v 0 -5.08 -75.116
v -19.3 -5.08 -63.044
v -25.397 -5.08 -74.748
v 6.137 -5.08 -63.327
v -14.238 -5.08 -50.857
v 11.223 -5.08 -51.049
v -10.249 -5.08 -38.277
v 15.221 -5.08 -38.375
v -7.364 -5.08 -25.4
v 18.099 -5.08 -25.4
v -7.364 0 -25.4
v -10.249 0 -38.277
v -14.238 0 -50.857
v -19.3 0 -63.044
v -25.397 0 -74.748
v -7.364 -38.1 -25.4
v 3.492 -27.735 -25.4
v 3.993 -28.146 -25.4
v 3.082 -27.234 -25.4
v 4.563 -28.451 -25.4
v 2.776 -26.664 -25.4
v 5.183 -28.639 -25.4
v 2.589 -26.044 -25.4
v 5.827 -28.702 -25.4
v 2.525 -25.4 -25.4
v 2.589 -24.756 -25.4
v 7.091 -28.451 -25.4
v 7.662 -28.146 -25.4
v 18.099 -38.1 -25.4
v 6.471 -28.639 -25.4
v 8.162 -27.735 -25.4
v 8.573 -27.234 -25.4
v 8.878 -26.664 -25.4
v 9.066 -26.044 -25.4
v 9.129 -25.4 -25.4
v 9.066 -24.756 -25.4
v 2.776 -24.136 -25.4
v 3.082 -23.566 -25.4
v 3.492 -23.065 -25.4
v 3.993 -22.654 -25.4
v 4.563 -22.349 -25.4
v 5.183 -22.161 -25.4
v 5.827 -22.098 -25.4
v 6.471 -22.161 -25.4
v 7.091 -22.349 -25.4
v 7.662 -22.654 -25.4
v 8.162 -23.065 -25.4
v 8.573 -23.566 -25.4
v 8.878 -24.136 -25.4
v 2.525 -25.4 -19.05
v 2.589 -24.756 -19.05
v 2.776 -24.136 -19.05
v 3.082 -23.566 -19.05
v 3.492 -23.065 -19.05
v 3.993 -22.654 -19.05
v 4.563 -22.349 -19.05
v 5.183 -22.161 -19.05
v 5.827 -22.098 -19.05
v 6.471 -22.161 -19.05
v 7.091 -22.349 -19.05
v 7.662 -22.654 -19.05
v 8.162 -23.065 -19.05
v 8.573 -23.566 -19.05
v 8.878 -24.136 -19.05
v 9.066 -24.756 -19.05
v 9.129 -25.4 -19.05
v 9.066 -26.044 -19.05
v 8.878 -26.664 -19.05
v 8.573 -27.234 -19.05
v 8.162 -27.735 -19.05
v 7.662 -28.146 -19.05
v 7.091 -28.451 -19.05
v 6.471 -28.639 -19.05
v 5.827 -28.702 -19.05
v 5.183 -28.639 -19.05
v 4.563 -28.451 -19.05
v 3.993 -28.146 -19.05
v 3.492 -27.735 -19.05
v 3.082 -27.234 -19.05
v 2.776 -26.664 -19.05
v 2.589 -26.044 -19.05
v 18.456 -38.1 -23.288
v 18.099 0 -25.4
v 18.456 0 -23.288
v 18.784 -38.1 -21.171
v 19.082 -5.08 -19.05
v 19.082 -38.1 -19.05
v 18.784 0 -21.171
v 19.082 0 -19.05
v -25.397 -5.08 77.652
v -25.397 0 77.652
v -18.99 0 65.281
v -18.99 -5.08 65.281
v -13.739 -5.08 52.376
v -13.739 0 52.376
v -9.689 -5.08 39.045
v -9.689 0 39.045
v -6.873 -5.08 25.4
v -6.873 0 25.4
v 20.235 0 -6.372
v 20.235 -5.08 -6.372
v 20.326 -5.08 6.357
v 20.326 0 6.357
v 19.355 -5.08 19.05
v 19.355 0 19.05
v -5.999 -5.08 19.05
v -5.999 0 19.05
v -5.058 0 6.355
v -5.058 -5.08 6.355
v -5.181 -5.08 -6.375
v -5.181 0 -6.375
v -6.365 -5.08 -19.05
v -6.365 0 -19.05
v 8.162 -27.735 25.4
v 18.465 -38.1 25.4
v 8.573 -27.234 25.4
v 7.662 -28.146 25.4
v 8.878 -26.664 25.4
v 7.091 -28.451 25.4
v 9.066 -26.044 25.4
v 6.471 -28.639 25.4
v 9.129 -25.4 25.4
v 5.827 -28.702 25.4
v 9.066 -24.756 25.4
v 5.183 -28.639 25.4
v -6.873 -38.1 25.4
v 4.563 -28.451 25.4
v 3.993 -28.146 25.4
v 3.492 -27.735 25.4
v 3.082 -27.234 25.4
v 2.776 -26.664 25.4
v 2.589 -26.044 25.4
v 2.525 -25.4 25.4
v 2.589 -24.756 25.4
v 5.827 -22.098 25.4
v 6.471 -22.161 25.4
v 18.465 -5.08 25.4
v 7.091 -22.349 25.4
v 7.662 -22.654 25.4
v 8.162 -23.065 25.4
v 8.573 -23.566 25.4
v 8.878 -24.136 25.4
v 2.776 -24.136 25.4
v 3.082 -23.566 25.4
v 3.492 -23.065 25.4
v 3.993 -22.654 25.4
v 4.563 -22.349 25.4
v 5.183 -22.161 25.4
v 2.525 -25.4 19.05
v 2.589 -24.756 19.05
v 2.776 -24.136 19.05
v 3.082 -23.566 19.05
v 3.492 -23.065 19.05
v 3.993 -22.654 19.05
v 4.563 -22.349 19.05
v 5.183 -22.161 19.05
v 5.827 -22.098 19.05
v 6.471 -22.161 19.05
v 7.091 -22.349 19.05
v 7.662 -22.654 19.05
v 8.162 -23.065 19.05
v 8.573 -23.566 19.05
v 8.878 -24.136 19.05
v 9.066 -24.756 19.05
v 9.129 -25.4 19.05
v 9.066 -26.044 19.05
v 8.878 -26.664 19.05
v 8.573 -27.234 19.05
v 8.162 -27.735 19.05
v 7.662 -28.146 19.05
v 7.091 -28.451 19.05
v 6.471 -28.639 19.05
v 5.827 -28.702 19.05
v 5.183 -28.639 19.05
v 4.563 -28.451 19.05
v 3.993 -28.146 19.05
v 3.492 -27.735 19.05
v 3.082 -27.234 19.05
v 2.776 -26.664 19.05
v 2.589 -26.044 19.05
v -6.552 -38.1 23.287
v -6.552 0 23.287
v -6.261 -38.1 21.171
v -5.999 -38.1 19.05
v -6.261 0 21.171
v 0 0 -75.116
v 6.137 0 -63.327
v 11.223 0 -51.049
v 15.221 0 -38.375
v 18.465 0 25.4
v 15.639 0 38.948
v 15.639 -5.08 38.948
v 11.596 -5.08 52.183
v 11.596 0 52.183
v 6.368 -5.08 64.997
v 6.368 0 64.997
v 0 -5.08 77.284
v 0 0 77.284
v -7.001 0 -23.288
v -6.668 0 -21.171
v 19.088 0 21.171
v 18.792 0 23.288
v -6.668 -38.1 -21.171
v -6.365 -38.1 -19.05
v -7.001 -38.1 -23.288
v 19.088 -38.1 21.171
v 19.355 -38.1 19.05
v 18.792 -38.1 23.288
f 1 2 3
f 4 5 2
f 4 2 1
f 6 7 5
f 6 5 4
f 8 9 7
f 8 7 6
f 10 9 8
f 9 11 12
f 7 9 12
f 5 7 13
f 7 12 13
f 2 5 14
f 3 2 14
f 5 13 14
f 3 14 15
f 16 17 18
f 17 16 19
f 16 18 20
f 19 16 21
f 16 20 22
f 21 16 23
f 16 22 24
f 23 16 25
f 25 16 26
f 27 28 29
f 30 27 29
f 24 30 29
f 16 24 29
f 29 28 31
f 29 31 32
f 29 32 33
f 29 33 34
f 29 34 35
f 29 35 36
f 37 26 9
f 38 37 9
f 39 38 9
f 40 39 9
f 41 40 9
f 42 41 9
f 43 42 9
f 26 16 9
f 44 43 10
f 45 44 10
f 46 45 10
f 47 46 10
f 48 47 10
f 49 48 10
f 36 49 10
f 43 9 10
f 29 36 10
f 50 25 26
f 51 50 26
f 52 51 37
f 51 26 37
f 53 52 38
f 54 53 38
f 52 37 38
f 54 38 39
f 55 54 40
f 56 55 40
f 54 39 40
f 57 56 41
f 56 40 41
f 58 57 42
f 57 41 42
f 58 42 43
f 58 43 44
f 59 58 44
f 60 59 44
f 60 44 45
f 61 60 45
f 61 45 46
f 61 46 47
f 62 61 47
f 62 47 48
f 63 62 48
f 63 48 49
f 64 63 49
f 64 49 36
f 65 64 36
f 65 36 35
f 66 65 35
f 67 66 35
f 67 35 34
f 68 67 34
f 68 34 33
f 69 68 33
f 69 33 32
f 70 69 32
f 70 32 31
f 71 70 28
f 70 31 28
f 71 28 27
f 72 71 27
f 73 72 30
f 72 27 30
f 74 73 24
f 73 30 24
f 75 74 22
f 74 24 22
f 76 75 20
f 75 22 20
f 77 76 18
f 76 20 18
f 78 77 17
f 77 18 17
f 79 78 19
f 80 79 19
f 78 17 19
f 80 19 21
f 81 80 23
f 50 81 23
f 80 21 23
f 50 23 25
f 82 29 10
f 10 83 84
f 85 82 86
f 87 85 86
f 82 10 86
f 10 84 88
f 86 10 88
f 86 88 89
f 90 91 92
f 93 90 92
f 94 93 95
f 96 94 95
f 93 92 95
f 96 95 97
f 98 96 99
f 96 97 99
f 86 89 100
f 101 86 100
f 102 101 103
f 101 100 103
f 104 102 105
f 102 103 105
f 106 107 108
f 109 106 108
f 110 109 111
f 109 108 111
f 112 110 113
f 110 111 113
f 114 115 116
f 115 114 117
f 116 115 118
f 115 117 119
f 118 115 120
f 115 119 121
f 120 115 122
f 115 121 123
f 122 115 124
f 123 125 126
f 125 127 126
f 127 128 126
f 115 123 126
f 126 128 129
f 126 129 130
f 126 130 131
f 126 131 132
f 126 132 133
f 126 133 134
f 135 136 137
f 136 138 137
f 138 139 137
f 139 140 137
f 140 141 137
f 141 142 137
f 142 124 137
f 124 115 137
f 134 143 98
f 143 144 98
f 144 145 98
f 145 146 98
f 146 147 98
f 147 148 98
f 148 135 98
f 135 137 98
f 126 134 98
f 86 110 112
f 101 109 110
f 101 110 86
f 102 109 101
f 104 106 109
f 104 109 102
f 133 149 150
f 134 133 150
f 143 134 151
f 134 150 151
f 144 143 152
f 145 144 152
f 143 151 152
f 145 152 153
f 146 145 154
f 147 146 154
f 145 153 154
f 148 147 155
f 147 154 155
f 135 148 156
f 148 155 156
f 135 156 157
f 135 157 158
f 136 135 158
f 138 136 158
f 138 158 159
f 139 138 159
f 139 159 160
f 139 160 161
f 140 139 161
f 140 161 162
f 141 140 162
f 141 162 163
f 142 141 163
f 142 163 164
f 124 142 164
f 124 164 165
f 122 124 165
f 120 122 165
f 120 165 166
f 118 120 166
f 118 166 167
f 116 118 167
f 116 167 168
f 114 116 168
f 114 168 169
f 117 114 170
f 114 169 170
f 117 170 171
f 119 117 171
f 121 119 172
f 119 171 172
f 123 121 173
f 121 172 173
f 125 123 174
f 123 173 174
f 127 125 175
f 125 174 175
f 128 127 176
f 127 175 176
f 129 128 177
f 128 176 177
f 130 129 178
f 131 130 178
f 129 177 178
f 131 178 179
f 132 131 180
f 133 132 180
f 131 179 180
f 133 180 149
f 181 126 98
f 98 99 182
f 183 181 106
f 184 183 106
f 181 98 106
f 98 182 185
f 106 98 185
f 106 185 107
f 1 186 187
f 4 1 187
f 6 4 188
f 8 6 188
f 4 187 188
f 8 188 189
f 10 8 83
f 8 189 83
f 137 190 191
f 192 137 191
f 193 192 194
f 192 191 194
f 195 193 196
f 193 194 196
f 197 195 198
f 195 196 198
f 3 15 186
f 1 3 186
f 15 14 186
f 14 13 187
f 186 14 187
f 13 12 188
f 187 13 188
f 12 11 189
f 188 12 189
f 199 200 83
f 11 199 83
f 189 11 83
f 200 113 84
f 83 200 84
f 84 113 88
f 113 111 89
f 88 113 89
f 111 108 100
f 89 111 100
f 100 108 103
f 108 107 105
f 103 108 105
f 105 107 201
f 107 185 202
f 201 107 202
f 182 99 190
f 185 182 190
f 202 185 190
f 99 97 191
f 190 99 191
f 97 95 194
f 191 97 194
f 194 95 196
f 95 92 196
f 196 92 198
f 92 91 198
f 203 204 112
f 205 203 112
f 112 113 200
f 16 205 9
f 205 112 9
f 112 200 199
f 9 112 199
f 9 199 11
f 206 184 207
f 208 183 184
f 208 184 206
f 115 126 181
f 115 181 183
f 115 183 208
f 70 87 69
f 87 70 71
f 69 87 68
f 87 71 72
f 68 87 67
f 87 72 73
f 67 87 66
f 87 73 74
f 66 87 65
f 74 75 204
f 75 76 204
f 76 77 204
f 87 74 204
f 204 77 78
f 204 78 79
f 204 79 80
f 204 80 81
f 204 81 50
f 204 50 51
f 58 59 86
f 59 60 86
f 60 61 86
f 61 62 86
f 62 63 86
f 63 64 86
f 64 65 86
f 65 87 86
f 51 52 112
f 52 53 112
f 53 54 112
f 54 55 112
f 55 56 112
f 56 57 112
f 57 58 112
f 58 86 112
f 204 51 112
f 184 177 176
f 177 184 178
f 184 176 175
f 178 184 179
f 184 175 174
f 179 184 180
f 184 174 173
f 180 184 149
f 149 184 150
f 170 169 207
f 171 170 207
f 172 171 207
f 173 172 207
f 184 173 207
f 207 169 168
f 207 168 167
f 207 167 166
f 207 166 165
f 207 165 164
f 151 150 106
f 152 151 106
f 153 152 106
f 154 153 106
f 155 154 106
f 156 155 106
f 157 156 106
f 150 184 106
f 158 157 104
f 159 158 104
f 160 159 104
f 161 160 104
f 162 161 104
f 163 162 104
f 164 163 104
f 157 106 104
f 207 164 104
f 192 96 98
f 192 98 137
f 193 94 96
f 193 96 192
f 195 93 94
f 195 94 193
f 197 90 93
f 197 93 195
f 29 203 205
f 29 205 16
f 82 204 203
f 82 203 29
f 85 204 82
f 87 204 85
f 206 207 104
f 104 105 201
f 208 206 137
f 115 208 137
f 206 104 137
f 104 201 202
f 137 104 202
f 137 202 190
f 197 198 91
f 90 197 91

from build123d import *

# Parameters (mm, degrees)
F1_DEPTH = 5.08
F2_DEPTH = 38.1
F4_D     = 6.604


with BuildPart() as f1:
    # F0 (on Front) → F1 (new body)
    with BuildSketch(Plane.XZ):
        with BuildLine():
            Line((-25.397333, -74.747579), (0, -75.115653))
            ThreePointArc((0, -75.115653), (11.223347, -51.049239), (18.098838, -25.4))
            Line((18.098838, -25.4), (-7.363914, -25.4))
            ThreePointArc((-7.363914, -25.4), (-14.238036, -50.856769), (-25.397333, -74.747579))
        make_face()
        with BuildLine():
            Line((-7.363914, -25.4), (18.098838, -25.4))
            ThreePointArc((18.098838, -25.4), (18.623813, -22.230181), (19.081848, -19.05))
            Line((19.081848, -19.05), (-6.365, -19.05))
            ThreePointArc((-6.365, -19.05), (-6.830974, -22.230267), (-7.363914, -25.4))
        make_face()
        with BuildLine():
            Line((-6.365, -19.05), (19.081848, -19.05))
            ThreePointArc((19.081848, -19.05), (20.41381, -0.008572), (19.355084, 19.05))
            Line((19.355084, 19.05), (-5.999007, 19.05))
            ThreePointArc((-5.999007, 19.05), (-4.986636, -0.011483), (-6.365, -19.05))
        make_face()
        with BuildLine():
            Line((-5.999007, 19.05), (19.355084, 19.05))
            ThreePointArc((19.355084, 19.05), (18.943654, 22.229679), (18.465424, 25.4))
            Line((18.465424, 25.4), (-6.872882, 25.4))
            ThreePointArc((-6.872882, 25.4), (-6.402556, 22.229595), (-5.999007, 19.05))
        make_face()
        with BuildLine():
            Line((-6.872882, 25.4), (18.465424, 25.4))
            ThreePointArc((18.465424, 25.4), (11.595818, 52.183193), (0, 77.284347))
            Line((0, 77.284347), (-25.397333, 77.652421))
            ThreePointArc((-25.397333, 77.652421), (-13.739127, 52.37563), (-6.872882, 25.4))
        make_face()
    extrude(amount=F1_DEPTH)

    # F0 (on Front) → F2 (join)
    with BuildSketch(Plane.XZ):
        with BuildLine():
            Line((-5.999007, 19.05), (19.355084, 19.05))
            ThreePointArc((19.355084, 19.05), (18.943654, 22.229679), (18.465424, 25.4))
            Line((18.465424, 25.4), (-6.872882, 25.4))
            ThreePointArc((-6.872882, 25.4), (-6.402556, 22.229595), (-5.999007, 19.05))
        make_face()
        with BuildLine():
            Line((-7.363914, -25.4), (18.098838, -25.4))
            ThreePointArc((18.098838, -25.4), (18.623813, -22.230181), (19.081848, -19.05))
            Line((19.081848, -19.05), (-6.365, -19.05))
            ThreePointArc((-6.365, -19.05), (-6.830974, -22.230267), (-7.363914, -25.4))
        make_face()
    extrude(amount=F2_DEPTH)

    # F4 (through all)
    with Locations(Plane.XY.offset(25.4)):
        with Locations((5.827118, -25.4)):
            Hole(F4_D / 2)


solid = f1.part
